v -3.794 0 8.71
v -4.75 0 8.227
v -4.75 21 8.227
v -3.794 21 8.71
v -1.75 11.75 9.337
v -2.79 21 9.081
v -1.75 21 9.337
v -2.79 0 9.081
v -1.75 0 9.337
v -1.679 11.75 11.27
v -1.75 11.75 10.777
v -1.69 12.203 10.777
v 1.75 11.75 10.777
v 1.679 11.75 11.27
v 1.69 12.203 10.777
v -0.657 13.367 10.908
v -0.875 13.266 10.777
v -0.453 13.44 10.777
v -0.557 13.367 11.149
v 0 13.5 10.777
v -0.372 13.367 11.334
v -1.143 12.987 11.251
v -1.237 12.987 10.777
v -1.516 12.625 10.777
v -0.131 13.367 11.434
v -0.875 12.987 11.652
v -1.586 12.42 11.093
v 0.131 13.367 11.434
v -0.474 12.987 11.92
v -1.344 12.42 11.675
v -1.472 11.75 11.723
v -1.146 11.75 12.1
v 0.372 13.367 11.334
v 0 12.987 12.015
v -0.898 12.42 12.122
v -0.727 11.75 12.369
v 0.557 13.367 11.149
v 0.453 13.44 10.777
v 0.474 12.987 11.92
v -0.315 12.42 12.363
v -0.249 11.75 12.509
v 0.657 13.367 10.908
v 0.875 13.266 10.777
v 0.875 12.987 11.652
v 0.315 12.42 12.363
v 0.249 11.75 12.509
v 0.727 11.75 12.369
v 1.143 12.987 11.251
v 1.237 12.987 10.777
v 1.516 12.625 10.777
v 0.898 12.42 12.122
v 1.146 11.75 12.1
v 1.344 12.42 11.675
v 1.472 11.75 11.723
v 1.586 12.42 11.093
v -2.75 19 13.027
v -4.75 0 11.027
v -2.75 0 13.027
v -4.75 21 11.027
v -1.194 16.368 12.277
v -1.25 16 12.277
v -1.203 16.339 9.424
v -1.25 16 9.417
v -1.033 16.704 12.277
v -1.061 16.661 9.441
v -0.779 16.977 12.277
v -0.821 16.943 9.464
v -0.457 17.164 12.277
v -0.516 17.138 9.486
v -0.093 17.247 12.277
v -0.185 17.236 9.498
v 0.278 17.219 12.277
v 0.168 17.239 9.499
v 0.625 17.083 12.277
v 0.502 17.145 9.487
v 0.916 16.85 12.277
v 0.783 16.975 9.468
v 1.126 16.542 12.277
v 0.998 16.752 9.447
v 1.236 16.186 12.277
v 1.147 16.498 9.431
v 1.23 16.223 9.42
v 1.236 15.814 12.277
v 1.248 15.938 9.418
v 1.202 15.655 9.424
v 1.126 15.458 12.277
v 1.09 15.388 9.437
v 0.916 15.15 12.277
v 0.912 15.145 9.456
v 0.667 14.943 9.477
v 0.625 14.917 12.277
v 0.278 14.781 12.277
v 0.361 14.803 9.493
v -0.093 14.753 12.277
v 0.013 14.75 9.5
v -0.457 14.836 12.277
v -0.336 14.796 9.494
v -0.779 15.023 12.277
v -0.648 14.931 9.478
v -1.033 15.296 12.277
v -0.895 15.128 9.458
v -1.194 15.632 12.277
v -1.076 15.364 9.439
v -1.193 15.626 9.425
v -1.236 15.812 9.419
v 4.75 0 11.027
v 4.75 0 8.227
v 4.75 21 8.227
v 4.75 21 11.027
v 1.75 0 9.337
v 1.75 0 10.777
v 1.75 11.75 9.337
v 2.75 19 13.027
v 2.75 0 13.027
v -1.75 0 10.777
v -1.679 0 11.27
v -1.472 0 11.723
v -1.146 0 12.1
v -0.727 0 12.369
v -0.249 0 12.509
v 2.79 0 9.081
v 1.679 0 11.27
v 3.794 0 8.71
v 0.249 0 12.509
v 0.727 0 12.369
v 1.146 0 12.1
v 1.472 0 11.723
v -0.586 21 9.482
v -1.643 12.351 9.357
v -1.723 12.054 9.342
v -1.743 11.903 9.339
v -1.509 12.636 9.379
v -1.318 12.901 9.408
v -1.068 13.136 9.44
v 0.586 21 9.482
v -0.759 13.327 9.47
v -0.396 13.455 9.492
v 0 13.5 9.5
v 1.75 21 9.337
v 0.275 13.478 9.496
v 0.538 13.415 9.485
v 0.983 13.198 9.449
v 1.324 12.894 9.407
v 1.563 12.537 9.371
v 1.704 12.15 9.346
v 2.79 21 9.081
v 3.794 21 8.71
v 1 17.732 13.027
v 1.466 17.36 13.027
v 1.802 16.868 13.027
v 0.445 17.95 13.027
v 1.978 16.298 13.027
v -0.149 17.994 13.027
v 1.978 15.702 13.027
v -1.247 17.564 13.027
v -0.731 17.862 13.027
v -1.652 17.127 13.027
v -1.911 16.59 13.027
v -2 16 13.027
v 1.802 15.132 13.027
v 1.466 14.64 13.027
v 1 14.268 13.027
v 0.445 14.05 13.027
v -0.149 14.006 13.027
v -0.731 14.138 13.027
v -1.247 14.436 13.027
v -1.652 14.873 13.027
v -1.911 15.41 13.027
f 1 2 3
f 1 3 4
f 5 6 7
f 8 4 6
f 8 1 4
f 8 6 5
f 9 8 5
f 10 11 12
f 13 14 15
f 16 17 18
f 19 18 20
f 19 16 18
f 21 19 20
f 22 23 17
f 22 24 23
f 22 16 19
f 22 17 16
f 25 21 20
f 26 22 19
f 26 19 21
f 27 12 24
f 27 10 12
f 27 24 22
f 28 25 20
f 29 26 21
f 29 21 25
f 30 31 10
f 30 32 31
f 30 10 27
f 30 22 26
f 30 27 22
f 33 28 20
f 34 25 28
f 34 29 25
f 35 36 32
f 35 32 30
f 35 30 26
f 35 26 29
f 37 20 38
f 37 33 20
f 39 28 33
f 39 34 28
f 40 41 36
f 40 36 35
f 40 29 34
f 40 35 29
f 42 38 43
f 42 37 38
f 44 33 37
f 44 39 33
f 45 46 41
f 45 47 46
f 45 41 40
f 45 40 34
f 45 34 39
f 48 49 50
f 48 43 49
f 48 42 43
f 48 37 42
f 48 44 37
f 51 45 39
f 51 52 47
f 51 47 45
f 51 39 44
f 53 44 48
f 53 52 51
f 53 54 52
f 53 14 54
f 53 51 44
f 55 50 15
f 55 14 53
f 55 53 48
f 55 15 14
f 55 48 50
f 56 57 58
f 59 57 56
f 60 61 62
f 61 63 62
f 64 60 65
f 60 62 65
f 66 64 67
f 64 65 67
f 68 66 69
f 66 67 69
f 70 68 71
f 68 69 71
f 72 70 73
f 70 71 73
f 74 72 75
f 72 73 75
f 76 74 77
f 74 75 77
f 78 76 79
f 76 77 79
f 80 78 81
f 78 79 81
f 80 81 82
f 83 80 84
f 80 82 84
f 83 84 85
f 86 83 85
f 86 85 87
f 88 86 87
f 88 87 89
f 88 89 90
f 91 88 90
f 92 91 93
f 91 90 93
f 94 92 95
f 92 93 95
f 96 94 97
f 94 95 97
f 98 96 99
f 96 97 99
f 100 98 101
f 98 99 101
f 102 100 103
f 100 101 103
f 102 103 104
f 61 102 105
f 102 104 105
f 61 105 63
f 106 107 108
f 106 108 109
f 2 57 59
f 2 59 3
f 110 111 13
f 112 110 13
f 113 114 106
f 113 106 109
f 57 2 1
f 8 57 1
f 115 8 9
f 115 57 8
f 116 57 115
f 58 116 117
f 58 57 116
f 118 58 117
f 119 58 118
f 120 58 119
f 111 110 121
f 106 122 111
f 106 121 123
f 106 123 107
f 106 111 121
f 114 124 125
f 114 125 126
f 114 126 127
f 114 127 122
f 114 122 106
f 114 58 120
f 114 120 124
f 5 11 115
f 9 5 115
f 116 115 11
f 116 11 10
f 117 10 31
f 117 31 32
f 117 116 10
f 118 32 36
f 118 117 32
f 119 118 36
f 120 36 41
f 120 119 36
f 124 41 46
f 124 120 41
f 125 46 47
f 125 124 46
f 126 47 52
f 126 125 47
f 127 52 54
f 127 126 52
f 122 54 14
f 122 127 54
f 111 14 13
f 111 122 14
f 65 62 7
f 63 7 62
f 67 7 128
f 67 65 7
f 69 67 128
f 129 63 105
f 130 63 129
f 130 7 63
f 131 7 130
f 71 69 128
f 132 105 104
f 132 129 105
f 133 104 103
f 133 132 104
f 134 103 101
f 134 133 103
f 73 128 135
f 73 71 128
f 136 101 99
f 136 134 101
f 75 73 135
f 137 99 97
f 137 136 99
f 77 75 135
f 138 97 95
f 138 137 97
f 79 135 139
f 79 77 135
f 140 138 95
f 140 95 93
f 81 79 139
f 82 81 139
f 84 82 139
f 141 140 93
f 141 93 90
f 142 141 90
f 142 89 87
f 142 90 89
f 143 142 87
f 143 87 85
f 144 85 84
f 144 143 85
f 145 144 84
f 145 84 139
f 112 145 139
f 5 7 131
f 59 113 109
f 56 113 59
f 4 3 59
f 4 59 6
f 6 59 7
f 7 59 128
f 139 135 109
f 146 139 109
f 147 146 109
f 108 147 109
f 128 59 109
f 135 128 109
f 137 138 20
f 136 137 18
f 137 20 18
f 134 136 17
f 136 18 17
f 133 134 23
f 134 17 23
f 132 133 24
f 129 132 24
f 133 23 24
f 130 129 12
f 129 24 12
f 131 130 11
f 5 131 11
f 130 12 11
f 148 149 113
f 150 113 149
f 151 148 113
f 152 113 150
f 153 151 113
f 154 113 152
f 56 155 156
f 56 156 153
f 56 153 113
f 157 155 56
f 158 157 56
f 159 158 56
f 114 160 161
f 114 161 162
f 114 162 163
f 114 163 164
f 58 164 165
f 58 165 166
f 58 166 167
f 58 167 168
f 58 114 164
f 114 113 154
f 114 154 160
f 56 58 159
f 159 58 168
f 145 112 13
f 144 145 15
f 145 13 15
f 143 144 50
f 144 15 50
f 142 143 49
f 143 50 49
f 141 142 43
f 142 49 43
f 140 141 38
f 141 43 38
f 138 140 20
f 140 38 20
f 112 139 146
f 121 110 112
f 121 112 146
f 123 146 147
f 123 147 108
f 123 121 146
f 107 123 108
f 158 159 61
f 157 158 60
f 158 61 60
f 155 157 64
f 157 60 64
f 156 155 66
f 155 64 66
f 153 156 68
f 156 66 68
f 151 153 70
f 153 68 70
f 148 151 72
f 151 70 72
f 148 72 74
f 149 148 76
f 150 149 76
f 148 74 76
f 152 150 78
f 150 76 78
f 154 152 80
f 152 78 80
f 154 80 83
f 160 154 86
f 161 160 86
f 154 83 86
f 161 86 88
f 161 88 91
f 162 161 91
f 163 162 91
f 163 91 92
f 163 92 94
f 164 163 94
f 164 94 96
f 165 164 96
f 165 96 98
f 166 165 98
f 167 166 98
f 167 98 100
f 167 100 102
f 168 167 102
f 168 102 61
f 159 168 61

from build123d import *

# Parameters (mm, degrees)
F6_DEPTH        = 21
F7_SIZE         = 2
F8_SIZE         = 2
F12_DEPTH       = 2.5510001
F14_D           = 2.5
F14_CSINK_D     = 4
F14_CSINK_ANGLE = 90


# Not quite as in the source:
# - a feature names something its author has since deleted; it is built from what else it names


with BuildPart() as f6:
    # F5 (on Front) → F6 (new body)
    with BuildSketch(Plane.XZ):
        with BuildLine():
            ThreePointArc((1.75, 9.3374246985), (3.2970633562, 8.9095102685), (4.75, 8.227241336))
            Line((4.75, 8.227241336), (4.75, 13.027241336))
            Line((4.75, 13.027241336), (-4.75, 13.027241336))
            Line((-4.75, 13.027241336), (-4.75, 8.227241336))
            ThreePointArc((-4.75, 8.227241336), (-3.2970633562, 8.9095102685), (-1.75, 9.3374246985))
            Line((-1.75, 9.3374246985), (-1.75, 10.777241336))
            ThreePointArc((-1.75, 10.777241336), (0, 12.527241336), (1.75, 10.777241336))
            Line((1.75, 10.777241336), (1.75, 9.3374246985))
        make_face()
        with BuildLine():
            ThreePointArc((-1.75, 9.3374246985), (0, 9.5), (1.75, 9.3374246985))
            Line((1.75, 9.3374246985), (1.75, 10.777241336))
            ThreePointArc((1.75, 10.777241336), (0, 12.527241336), (-1.75, 10.777241336))
            Line((-1.75, 10.777241336), (-1.75, 9.3374246985))
        make_face()
    extrude(amount=-F6_DEPTH)

    # F7
    f7_edges = [f6.edges().sort_by_distance(p)[0] for p in [
        (-4.75, 10.5, 13.027241),
        (4.75, 10.5, 13.027241),
    ]]
    chamfer(f7_edges, length=F7_SIZE)

    # F8
    f8_edges = [f6.edges().sort_by_distance(p)[0] for p in [
        (0, 21, 13.027241),
    ]]
    chamfer(f8_edges, length=F8_SIZE)

    # F10 (on offset) → F11 (revolve, cut)
    with BuildSketch(Plane.XY.offset(10.777241336)):
        with BuildLine():
            Line((-1.75, 11.75), (-1.75, 0))
            Line((-1.75, 0), (0, 0))
            Line((0, 0), (0, 13.5))
            ThreePointArc((0, 13.5), (-1.2374368671, 12.9874368671), (-1.75, 11.75))
        make_face()
    revolve(axis=Axis((0, 6.75, 10.777241336), (0, 1, 0)), mode=Mode.SUBTRACT)

    # F10 (on offset) → F12 (cut, through all)
    with BuildSketch(Plane.XY.offset(10.777241336)):
        with BuildLine():
            Line((0, 13.5), (0, 0))
            Line((0, 0), (1.75, 0))
            Line((1.75, 0), (1.75, 11.75))
            ThreePointArc((1.75, 11.75), (1.2374368671, 12.9874368671), (0, 13.5))
        make_face()
        with BuildLine():
            Line((-1.75, 11.75), (-1.75, 0))
            Line((-1.75, 0), (0, 0))
            Line((0, 0), (0, 13.5))
            ThreePointArc((0, 13.5), (-1.2374368671, 12.9874368671), (-1.75, 11.75))
        make_face()
    extrude(amount=-F12_DEPTH, mode=Mode.SUBTRACT)

    # F14 (through all)
    with Locations(Plane.XY.offset(13.027241336)):
        with Locations((0, 16)):
            CounterSinkHole(F14_D / 2, F14_CSINK_D / 2, counter_sink_angle=F14_CSINK_ANGLE)


solid = f6.part
